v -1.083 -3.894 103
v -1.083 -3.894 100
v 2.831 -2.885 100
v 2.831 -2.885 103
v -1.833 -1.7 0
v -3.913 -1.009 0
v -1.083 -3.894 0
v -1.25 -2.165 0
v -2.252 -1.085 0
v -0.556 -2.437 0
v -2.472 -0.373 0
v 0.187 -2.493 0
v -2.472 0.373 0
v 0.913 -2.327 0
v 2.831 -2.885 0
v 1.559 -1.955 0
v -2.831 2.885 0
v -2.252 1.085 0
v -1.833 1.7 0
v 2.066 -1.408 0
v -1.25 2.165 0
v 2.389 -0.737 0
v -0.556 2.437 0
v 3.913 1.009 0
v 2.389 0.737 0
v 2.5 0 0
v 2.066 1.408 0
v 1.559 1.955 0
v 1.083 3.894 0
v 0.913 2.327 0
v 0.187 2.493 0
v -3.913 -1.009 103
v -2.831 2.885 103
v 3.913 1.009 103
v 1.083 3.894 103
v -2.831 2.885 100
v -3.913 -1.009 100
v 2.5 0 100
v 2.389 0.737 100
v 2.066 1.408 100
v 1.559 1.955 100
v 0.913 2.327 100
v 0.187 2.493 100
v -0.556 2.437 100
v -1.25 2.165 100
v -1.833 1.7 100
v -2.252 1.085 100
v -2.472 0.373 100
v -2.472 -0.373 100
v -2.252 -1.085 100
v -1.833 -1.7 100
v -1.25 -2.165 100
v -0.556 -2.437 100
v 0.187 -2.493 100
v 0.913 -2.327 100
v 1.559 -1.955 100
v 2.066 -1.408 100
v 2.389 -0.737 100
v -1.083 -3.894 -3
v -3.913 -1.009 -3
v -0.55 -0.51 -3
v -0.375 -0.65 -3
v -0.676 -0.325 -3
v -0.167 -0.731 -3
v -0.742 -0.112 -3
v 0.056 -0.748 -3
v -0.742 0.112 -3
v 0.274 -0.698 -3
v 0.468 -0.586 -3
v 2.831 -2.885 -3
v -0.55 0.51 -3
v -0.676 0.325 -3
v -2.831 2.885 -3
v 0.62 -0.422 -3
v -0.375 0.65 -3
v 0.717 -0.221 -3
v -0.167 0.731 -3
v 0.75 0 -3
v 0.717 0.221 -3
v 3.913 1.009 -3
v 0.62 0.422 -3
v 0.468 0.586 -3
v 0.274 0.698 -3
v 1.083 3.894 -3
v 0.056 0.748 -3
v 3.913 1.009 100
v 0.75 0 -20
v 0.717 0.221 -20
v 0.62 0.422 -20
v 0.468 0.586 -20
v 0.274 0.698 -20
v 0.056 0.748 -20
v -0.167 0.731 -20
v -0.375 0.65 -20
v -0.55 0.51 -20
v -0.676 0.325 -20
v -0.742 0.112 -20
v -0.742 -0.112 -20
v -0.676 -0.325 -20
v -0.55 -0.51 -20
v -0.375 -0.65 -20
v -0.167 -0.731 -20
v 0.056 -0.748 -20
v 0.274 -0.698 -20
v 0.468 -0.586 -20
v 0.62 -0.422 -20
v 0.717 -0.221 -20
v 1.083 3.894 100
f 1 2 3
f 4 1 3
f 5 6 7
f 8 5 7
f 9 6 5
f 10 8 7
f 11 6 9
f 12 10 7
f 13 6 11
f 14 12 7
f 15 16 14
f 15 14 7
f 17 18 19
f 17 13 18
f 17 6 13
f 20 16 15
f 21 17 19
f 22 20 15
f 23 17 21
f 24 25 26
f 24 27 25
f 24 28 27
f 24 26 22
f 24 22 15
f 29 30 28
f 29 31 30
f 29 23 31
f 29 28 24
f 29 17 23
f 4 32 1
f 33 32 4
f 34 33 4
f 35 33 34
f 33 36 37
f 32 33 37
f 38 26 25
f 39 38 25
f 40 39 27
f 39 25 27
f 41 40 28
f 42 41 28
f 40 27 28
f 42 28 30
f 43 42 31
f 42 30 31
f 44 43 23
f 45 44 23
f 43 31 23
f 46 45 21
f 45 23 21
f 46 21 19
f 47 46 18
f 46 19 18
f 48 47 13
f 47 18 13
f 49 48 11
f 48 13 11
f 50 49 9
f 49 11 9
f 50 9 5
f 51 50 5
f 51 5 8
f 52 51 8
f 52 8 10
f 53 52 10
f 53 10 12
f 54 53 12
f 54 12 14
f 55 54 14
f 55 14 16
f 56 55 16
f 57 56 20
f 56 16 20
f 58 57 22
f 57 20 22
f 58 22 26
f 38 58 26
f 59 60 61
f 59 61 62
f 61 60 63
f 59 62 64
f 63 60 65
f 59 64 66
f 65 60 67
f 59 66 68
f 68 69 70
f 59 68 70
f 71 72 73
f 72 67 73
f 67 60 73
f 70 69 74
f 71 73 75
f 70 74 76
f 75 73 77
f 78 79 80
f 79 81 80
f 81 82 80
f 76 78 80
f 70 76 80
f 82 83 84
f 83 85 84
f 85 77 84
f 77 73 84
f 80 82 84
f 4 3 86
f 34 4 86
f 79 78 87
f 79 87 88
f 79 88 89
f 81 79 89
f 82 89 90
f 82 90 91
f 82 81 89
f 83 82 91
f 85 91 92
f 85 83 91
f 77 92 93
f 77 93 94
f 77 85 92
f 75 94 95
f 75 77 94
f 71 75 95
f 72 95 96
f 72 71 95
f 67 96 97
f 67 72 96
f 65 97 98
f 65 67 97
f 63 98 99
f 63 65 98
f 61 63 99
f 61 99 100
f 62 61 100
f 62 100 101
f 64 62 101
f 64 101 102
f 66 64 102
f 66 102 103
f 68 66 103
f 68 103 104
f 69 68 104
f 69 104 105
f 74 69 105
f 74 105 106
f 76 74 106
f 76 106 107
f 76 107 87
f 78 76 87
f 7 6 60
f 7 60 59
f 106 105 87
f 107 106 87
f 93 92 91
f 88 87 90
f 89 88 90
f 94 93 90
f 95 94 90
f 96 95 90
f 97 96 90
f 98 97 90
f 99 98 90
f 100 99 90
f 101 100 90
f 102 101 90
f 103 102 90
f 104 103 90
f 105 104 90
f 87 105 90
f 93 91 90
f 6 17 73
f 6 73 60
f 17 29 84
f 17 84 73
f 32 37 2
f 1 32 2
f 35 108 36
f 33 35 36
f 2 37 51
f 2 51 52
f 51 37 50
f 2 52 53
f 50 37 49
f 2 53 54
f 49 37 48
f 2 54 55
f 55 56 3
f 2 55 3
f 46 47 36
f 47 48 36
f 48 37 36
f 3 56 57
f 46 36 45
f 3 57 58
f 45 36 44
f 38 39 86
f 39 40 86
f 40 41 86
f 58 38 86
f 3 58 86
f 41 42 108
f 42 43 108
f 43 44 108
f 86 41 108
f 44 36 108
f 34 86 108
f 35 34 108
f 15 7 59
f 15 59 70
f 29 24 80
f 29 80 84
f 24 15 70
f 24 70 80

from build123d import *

# Parameters (mm, degrees)
SKETCH_1_R      = 2.5
EXTRUDE_1_DEPTH = 100
EXTRUDE_2_DEPTH = 3
EXTRUDE_START   = 100
EXTRUDE_3_DEPTH = 3
SKETCH_5_R      = 0.75
EXTRUDE_4_DEPTH = 20


with BuildPart() as part:
    # 草圖1 → 填料-伸長1 (new body)
    with BuildSketch(Plane.XY):
        Circle(SKETCH_1_R)
    extrude(amount=EXTRUDE_1_DEPTH)

    # 草圖3 → 填料-伸長2 (add)
    with BuildSketch(Plane.XY):
        Polygon((1.082752823, 3.893710269), (-2.830675596, 2.884546585), (-3.913428419, -1.009163684), (-1.082752823, -3.893710269), (2.830675596, -2.884546585), (3.913428419, 1.009163684), align=None)
    extrude(amount=-EXTRUDE_2_DEPTH)

    # 草圖4 → 填料-伸長3 (add)
    with BuildSketch(Plane.XY.offset(EXTRUDE_START)):
        Polygon((-2.830675596, 2.884546585), (-3.913428419, -1.009163684), (-1.082752823, -3.893710269), (2.830675596, -2.884546585), (3.913428419, 1.009163684), (1.082752823, 3.893710269), align=None)
    extrude(amount=EXTRUDE_3_DEPTH)

    # 草圖5 → 填料-伸長4 (add)
    with BuildSketch(Plane.XY):
        Circle(SKETCH_5_R)
    extrude(amount=-EXTRUDE_4_DEPTH)


solid = part.part
